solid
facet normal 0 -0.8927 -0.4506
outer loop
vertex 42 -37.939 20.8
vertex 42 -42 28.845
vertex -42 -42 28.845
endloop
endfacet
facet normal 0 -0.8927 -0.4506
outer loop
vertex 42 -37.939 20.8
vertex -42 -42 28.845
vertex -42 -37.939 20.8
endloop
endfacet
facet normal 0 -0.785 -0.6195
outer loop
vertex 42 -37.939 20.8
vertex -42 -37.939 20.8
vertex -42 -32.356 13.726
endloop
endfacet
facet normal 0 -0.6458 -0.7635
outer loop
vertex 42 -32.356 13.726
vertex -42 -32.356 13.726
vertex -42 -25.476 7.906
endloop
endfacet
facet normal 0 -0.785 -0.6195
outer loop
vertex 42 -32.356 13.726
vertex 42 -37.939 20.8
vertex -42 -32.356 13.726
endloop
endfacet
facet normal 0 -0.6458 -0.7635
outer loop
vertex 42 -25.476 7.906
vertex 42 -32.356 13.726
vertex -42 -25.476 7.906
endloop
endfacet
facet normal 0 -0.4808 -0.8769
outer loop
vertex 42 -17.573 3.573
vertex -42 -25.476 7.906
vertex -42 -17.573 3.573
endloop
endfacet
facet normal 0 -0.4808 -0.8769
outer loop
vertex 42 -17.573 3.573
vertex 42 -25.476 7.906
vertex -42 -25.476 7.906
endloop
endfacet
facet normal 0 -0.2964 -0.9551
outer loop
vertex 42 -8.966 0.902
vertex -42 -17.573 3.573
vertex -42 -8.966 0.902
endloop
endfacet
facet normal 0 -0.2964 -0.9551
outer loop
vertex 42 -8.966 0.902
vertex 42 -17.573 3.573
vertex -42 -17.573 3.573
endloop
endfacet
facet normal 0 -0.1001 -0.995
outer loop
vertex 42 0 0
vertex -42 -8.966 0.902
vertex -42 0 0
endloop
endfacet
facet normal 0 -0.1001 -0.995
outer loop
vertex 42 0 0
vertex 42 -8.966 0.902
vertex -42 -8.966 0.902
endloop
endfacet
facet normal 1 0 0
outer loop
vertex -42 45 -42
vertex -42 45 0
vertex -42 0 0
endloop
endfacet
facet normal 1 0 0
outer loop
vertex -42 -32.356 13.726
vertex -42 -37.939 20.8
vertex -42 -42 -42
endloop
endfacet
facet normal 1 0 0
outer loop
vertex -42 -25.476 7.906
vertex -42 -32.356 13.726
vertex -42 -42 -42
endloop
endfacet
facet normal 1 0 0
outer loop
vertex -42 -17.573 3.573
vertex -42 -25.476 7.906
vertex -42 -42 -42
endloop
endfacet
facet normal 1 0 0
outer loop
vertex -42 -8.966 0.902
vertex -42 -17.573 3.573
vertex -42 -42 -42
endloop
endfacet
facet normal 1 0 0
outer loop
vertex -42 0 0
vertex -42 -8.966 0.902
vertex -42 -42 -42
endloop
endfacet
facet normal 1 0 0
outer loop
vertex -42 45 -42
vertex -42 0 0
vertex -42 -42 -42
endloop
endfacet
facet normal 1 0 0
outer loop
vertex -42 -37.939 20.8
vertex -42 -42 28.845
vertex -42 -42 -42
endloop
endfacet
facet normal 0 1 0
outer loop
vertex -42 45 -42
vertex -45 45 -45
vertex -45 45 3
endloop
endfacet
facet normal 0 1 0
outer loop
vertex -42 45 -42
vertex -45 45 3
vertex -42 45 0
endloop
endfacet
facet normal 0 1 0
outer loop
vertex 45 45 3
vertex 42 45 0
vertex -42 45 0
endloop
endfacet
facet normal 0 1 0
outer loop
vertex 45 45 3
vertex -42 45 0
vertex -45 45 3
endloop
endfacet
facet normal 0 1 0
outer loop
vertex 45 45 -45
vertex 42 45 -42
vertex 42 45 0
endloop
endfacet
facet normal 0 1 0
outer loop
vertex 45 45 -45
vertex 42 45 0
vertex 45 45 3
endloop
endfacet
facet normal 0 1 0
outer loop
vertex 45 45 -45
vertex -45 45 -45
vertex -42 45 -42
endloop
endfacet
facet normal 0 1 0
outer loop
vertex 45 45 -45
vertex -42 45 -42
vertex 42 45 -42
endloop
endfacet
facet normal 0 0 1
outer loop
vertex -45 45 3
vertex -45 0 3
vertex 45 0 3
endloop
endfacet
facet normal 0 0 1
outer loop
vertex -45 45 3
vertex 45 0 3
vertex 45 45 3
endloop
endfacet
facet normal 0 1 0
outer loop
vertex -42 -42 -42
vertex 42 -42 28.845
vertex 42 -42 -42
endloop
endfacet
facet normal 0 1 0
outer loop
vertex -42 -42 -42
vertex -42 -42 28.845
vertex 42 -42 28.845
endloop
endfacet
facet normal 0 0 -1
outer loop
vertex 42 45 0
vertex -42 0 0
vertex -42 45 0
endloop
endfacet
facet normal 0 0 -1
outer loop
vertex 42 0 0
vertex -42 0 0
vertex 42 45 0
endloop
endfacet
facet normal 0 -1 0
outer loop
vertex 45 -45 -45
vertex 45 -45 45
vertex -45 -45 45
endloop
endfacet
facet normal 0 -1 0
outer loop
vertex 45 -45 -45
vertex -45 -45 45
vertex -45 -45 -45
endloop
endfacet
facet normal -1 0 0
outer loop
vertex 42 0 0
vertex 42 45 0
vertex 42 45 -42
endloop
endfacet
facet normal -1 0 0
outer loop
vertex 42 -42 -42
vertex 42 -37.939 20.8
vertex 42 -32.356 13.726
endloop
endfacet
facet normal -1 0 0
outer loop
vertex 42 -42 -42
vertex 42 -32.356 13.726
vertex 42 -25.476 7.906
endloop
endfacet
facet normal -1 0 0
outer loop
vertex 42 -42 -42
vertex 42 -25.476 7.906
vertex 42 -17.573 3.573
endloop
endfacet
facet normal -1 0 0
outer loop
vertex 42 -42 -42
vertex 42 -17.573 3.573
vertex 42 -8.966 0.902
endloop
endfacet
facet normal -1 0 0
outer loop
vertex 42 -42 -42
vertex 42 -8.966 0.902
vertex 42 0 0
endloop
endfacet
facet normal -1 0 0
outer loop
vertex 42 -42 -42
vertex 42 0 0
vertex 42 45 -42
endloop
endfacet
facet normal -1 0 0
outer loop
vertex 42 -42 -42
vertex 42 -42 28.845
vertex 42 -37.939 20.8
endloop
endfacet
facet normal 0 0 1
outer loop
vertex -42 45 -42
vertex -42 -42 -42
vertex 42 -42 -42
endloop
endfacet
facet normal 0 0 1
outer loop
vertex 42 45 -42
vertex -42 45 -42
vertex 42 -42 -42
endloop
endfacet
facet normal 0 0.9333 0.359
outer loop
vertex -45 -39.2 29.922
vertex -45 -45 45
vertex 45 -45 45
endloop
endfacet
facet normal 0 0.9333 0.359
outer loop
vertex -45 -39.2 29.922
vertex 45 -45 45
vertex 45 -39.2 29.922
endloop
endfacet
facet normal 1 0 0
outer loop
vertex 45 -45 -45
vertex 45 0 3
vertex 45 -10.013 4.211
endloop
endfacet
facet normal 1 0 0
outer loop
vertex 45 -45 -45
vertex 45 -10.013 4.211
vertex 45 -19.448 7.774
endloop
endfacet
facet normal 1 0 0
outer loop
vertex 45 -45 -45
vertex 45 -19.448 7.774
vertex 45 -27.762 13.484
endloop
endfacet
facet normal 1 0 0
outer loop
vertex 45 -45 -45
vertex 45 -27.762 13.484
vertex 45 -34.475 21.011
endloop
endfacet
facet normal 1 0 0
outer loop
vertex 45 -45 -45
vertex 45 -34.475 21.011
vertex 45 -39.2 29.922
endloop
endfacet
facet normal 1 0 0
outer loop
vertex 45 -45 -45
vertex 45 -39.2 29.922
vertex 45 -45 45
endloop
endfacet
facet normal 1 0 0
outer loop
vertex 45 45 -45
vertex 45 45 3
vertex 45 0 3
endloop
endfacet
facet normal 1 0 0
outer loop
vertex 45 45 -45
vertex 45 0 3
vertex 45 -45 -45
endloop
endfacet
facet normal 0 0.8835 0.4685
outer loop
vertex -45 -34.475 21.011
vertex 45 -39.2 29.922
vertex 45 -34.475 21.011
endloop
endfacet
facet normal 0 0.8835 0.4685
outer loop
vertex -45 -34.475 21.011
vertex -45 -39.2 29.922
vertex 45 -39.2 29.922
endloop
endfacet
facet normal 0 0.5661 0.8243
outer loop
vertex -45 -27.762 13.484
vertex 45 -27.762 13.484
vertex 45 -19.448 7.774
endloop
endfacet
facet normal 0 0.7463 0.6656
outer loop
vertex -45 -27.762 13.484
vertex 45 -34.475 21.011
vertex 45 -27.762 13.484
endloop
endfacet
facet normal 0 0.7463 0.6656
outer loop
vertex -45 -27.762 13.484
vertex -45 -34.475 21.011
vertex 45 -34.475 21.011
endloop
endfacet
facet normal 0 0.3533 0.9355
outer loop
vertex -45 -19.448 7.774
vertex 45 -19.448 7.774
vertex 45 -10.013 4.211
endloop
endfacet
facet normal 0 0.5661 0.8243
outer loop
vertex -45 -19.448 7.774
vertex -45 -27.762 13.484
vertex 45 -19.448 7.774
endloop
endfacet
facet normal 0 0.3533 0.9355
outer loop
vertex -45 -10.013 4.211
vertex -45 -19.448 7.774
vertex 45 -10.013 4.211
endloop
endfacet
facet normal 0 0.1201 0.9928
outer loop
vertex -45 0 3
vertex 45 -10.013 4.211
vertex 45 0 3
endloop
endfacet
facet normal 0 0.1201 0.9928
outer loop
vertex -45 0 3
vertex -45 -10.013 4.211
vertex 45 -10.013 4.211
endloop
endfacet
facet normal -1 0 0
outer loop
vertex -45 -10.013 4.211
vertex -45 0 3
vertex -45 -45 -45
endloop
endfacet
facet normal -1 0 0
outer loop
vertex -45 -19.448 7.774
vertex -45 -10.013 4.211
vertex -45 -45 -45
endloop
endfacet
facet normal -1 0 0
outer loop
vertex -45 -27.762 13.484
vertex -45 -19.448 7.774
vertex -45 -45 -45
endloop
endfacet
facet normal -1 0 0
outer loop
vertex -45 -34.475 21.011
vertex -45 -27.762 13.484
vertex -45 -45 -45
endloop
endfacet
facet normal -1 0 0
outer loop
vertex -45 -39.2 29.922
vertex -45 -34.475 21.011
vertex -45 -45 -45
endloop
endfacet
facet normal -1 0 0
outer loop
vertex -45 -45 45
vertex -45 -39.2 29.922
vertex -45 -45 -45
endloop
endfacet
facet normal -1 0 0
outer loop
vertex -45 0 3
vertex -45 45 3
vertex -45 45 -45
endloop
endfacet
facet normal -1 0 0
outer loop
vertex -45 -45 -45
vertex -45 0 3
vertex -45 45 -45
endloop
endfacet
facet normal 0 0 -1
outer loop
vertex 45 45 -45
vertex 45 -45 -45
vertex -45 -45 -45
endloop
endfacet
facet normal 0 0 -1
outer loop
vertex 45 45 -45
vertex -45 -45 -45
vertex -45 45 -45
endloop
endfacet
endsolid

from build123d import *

# Parameters (mm, degrees)
ESBO_O1_W                  = 90
ESBO_O1_H                  = 90
ESBO_O1_W_2                = 84
ESBO_O1_H_2                = 84
EXTRUS_O_FINA2_DEPTH       = 45
CORTE_EXTRUS_O1_DEPTH      = 78.942286341
CORTE_EXTRUS_O1_DEPTH_BACK = 78.942286341
ESBO_O5_W                  = 3
ESBO_O5_H                  = 84
ESBO_O7_R                  = 45
ESBO_O7_R_2                = 42
EXTRUS_O_FINA4_DEPTH       = 45
CORTE_EXTRUS_O2_DEPTH      = 111.227038425
CORTE_EXTRUS_O2_DEPTH_BACK = 111.227038425
ESBO_O9_W                  = 3
ESBO_O9_H                  = 45
RESSALTO_EXTRUS_O1_DEPTH   = 45
ESBO_O10_W                 = 3
ESBO_O10_H                 = 90
RESSALTO_EXTRUS_O2_DEPTH   = 45
ESBO_O11_W                 = 3
ESBO_O11_H                 = 90
RESSALTO_EXTRUS_O3_DEPTH   = 45
CORTE_EXTRUS_O4_DEPTH      = 78.942286341
CORTE_EXTRUS_O4_DEPTH_BACK = 78.942286341
CORTE_EXTRUS_O5_DEPTH      = 78.942286341
CORTE_EXTRUS_O5_DEPTH_BACK = 78.942286341
ESBO_O14_R                 = 42
CORTE_EXTRUS_O6_DEPTH      = 78.942286341
CORTE_EXTRUS_O6_DEPTH_BACK = 78.942286341
ESBO_O16_W                 = 84
ESBO_O16_H                 = 42
CORTE_EXTRUS_O8_DEPTH      = 78.942286341


with BuildPart() as part:
    # Esboço1 → Extrusão-Fina2 (new, symmetric)
    with BuildSketch(Plane(origin=(0, 0, 0), x_dir=(0, 0, -1), z_dir=(1, 0, 0))):
        Rectangle(ESBO_O1_W, ESBO_O1_H)
        Rectangle(ESBO_O1_W_2, ESBO_O1_H_2, mode=Mode.SUBTRACT)
    extrude(amount=EXTRUS_O_FINA2_DEPTH, both=True)

    # Esboço5 → Corte-extrusão1 (cut, two sides: drawn at the far end of the back side and taken through both)
    with BuildSketch(Plane(origin=(0, 0, 0), x_dir=(0, 0, -1), z_dir=(1, 0, 0)).offset(-CORTE_EXTRUS_O1_DEPTH_BACK)):
        with Locations((-43.5, 0)):
            Rectangle(ESBO_O5_W, ESBO_O5_H)
    extrude(amount=CORTE_EXTRUS_O1_DEPTH + CORTE_EXTRUS_O1_DEPTH_BACK, mode=Mode.SUBTRACT)

    # Esboço7 → Extrusão-Fina4 (add, symmetric)
    with BuildSketch(Plane(origin=(0, 0, 0), x_dir=(0, 0, -1), z_dir=(1, 0, 0))):
        with Locations((-45, 0)):
            Circle(ESBO_O7_R)
        with Locations((-45, 0)):
            Circle(ESBO_O7_R_2, mode=Mode.SUBTRACT)
    extrude(amount=EXTRUS_O_FINA4_DEPTH, both=True)

    # Esboço8 → Corte-extrusão2 (cut, two sides: drawn at the far end of the back side and taken through both)
    with BuildSketch(Plane(origin=(0, 0, 0), x_dir=(0, 0, -1), z_dir=(1, 0, 0)).offset(-CORTE_EXTRUS_O2_DEPTH_BACK)):
        Polygon((-45, -45), (-29.921616549, -39.200030007), (-3, 0), (-3, 45), (-95.371690307, 45), (-95.371690307, -45), align=None)
    extrude(amount=CORTE_EXTRUS_O2_DEPTH + CORTE_EXTRUS_O2_DEPTH_BACK, mode=Mode.SUBTRACT)

    # Esboço9 → Ressalto-extrusão1 (add, symmetric)
    with BuildSketch(Plane(origin=(0, 0, 0), x_dir=(0, 0, -1), z_dir=(1, 0, 0))):
        with Locations((-1.5, 22.5)):
            Rectangle(ESBO_O9_W, ESBO_O9_H)
    extrude(amount=RESSALTO_EXTRUS_O1_DEPTH, both=True)

    # Esboço10 → Ressalto-extrusão2 (add, symmetric)
    with BuildSketch(Plane(origin=(0, 0, 0), x_dir=(1, 0, 0), z_dir=(0, 1, 0))):
        with Locations((-43.5, 0)):
            Rectangle(ESBO_O10_W, ESBO_O10_H)
    extrude(amount=RESSALTO_EXTRUS_O2_DEPTH, both=True)

    # Esboço11 → Ressalto-extrusão3 (add, symmetric)
    with BuildSketch(Plane(origin=(0, 0, 0), x_dir=(1, 0, 0), z_dir=(0, 1, 0))):
        with Locations((43.5, 0)):
            Rectangle(ESBO_O11_W, ESBO_O11_H)
    extrude(amount=RESSALTO_EXTRUS_O3_DEPTH, both=True)

    # Esboço13 → Corte-extrusão4 (cut, two sides: drawn at the far end of the back side and taken through both)
    with BuildSketch(Plane(origin=(0, 0, 0), x_dir=(0, 0, -1), z_dir=(1, 0, 0)).offset(-CORTE_EXTRUS_O4_DEPTH_BACK)):
        Polygon((-3, 0), (-3, 45), (-45, 45), (-45, -45), align=None)
    extrude(amount=CORTE_EXTRUS_O4_DEPTH + CORTE_EXTRUS_O4_DEPTH_BACK, mode=Mode.SUBTRACT)

    # Esboço14 → Corte-extrusão5 (cut, two sides: drawn at the far end of the back side and taken through both)
    with BuildSketch(Plane(origin=(0, 0, 0), x_dir=(0, 0, -1), z_dir=(1, 0, 0)).offset(-CORTE_EXTRUS_O5_DEPTH_BACK)):
        with Locations((-45, 0)):
            Circle(ESBO_O14_R)
    extrude(amount=CORTE_EXTRUS_O5_DEPTH + CORTE_EXTRUS_O5_DEPTH_BACK, mode=Mode.SUBTRACT)

    # Esboço15 → Corte-extrusão6 (cut, two sides: drawn at the far end of the back side and taken through both)
    with BuildSketch(Plane(origin=(0, 0, 0), x_dir=(0, 0, -1), z_dir=(1, 0, 0)).offset(-CORTE_EXTRUS_O6_DEPTH_BACK)):
        Polygon((-45, -45), (-29.921616549, -39.200030007), (-45.529383671, 1.376024306), align=None)
    extrude(amount=CORTE_EXTRUS_O6_DEPTH + CORTE_EXTRUS_O6_DEPTH_BACK, mode=Mode.SUBTRACT)

    # Esboço16 → Corte-extrusão8 (cut, through all)
    with BuildSketch(Plane(origin=(0, 0, 0), x_dir=(1, 0, 0), z_dir=(0, 1, 0))):
        with Locations((0, 21)):
            Rectangle(ESBO_O16_W, ESBO_O16_H)
    extrude(amount=CORTE_EXTRUS_O8_DEPTH, mode=Mode.SUBTRACT)


solid = part.part
